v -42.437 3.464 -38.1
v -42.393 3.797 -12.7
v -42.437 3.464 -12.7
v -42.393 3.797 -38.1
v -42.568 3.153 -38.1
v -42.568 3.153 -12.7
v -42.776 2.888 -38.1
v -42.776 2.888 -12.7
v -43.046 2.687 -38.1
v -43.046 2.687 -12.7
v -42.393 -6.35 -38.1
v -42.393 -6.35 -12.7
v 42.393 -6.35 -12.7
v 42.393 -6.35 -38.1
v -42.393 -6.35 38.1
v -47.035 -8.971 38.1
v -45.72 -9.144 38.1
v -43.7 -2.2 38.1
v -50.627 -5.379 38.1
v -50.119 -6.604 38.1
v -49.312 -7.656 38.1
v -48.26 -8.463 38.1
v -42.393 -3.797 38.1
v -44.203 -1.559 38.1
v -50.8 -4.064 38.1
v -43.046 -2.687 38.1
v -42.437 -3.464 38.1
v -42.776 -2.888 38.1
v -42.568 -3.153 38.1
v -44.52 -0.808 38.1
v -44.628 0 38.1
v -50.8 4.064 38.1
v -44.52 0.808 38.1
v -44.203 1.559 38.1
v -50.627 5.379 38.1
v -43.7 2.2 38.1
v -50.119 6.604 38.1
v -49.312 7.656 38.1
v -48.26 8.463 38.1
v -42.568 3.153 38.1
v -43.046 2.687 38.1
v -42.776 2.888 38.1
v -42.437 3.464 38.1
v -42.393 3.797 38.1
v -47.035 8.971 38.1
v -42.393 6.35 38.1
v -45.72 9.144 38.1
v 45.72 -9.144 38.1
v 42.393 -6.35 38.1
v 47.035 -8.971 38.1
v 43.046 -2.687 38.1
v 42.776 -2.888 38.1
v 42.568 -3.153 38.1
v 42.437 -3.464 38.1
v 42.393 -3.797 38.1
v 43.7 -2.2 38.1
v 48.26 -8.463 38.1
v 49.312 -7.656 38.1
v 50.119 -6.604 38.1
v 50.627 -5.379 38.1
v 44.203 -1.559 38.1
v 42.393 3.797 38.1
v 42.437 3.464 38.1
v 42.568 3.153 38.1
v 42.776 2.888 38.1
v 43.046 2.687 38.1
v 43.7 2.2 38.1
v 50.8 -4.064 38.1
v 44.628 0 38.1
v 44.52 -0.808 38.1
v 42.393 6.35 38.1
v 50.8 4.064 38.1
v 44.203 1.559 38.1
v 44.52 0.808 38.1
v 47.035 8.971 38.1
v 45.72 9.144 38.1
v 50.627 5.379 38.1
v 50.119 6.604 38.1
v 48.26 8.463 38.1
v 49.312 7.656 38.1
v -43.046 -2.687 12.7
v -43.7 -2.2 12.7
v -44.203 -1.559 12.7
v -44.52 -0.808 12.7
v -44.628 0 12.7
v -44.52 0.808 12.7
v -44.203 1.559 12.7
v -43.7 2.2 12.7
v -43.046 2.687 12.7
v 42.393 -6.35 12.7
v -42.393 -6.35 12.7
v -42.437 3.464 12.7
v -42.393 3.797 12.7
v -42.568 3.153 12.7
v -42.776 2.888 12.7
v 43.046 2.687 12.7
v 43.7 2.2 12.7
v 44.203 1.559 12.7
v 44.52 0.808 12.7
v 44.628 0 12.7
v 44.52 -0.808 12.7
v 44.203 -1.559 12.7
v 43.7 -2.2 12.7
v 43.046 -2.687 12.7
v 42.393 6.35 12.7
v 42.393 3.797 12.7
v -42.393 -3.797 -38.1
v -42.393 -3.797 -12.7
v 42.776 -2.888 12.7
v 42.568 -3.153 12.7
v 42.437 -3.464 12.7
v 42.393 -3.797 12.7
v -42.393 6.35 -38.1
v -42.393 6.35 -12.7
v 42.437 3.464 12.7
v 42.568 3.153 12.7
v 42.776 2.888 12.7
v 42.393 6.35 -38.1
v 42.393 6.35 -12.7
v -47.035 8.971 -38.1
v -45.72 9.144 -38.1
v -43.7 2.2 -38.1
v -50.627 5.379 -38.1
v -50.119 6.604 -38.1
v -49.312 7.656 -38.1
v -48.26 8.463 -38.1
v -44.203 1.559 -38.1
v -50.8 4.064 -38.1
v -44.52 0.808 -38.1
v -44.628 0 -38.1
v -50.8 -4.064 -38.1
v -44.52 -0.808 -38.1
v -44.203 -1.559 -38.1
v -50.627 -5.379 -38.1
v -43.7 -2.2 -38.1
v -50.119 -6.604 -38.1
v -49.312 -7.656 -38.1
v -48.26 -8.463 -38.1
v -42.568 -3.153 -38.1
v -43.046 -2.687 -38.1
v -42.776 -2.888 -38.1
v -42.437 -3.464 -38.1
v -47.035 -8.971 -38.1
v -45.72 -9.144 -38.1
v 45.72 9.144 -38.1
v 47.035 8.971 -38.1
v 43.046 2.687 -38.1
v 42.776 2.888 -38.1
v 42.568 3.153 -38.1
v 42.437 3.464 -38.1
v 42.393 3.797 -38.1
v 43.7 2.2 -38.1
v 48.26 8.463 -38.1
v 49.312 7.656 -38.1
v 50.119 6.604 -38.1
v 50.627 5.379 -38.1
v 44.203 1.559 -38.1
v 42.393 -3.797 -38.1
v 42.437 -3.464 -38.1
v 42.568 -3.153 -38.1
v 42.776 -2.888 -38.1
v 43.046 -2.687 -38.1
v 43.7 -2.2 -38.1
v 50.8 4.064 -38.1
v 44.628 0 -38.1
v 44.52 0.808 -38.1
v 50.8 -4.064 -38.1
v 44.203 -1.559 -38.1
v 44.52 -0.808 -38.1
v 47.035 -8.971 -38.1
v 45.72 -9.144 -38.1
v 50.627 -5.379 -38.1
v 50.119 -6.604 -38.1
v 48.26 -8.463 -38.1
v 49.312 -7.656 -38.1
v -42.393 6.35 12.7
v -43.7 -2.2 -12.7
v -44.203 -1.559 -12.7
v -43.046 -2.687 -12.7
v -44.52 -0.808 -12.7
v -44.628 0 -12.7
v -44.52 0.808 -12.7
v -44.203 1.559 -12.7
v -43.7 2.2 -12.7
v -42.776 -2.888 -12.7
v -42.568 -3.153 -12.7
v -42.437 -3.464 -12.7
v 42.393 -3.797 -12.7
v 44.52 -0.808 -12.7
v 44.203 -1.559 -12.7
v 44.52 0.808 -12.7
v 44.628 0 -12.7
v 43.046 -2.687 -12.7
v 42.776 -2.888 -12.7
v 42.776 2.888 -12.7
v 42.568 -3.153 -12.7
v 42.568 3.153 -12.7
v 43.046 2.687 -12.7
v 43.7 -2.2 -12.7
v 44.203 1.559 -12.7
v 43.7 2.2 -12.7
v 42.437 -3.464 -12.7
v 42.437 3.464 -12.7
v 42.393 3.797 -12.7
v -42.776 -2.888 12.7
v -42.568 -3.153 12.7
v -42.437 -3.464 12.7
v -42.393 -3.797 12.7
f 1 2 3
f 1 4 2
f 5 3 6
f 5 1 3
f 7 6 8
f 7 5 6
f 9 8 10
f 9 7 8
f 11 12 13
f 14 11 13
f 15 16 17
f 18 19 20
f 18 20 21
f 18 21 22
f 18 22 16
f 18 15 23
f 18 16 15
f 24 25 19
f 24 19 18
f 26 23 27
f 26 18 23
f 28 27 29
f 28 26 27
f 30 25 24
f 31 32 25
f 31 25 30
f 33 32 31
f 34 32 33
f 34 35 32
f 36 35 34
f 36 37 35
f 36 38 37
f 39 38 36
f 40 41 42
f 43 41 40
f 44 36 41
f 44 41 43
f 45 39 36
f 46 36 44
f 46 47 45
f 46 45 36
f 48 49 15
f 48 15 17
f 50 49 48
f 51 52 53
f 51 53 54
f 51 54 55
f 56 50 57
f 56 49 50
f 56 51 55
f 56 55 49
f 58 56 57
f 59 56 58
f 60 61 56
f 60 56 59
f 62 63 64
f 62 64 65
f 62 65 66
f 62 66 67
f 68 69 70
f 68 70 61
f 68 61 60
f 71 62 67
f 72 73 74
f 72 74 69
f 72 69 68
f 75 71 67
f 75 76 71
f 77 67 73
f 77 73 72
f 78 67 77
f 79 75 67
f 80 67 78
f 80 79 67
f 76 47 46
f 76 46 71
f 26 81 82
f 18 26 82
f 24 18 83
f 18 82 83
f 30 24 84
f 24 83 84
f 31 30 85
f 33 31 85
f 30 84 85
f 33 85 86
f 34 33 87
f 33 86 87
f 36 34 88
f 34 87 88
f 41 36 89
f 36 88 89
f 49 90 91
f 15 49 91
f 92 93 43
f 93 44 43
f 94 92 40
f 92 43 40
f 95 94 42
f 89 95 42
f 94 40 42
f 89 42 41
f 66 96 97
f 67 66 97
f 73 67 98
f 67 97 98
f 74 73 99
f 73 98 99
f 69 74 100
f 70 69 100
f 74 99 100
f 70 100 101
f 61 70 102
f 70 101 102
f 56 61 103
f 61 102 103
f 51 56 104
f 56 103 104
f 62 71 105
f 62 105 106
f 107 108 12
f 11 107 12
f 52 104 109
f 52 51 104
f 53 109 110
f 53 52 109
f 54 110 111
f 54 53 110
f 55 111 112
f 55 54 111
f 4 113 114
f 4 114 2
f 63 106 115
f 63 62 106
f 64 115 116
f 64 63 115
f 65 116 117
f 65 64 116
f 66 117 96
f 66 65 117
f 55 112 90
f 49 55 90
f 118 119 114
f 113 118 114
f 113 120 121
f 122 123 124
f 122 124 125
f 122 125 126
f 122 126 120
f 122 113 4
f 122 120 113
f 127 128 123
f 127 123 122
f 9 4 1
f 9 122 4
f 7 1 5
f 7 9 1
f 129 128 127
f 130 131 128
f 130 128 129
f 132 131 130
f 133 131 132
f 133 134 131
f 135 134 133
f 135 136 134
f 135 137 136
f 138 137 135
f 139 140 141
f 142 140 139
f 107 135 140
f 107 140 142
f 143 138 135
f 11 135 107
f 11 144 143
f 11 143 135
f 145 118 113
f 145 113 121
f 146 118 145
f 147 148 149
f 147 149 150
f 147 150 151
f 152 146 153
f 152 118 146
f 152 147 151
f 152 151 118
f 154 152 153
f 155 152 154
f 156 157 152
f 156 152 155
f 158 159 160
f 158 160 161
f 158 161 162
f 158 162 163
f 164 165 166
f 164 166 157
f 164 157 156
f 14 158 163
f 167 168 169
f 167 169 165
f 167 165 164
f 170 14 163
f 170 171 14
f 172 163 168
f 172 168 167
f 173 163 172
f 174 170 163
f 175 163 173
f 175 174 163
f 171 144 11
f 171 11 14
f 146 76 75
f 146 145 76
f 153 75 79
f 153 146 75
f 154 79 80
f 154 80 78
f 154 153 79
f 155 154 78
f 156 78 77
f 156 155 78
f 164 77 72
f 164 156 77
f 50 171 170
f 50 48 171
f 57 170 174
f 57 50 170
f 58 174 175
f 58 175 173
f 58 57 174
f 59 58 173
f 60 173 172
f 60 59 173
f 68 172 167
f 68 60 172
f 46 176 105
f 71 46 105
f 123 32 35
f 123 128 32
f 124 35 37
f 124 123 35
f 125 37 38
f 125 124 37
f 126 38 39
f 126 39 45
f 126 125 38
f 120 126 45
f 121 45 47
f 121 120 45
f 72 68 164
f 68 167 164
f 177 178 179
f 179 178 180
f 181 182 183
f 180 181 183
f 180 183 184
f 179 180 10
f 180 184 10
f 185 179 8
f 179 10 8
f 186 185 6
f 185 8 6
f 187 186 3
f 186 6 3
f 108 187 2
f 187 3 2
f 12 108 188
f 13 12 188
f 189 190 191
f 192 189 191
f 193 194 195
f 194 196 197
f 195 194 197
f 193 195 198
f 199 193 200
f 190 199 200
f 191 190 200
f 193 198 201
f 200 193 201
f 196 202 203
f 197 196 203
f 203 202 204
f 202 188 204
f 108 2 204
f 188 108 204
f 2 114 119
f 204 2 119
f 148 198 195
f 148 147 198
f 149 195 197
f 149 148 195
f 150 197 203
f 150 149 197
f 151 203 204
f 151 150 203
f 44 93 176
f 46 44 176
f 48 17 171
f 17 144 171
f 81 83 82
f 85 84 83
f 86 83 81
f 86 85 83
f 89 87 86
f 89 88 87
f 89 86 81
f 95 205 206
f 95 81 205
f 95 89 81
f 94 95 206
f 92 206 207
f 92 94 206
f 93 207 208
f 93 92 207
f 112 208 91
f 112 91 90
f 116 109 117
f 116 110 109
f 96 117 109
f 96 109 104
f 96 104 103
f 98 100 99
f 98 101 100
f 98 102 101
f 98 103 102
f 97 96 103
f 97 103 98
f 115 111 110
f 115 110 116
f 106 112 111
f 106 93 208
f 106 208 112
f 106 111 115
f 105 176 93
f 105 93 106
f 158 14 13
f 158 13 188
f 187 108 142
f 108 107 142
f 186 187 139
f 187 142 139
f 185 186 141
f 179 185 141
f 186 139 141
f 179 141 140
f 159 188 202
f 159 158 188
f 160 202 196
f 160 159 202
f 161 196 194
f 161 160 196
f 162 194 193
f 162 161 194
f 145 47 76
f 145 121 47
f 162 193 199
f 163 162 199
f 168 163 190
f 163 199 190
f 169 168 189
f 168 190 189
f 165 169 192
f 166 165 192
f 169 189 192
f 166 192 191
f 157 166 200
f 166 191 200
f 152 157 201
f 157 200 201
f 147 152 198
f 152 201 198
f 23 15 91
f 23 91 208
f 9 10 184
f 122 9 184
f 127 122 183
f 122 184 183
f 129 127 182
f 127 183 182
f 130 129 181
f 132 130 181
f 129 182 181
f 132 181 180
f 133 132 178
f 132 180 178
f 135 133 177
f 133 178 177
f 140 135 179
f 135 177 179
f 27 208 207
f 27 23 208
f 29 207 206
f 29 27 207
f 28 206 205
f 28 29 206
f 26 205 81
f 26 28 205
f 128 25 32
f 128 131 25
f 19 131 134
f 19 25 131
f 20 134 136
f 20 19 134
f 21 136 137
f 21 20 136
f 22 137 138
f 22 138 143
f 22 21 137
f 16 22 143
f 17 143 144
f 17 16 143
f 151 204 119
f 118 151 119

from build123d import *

# Parameters (mm, degrees)
F0_W     = 101.6
F0_H     = 18.288
F1_DEPTH = 12.7
F2_W     = 101.6
F2_H     = 18.288
F4_DEPTH = 25.4
F3_W     = 101.6
F3_H     = 18.288
F5_DEPTH = 25.4
F6_R     = 1.27
F7_R     = 5.08


with BuildPart() as f1:
    # F0 (on Top) → F1 (new body, symmetric)
    with BuildSketch(Plane.XY):
        Rectangle(F0_W, F0_H)
    extrude(amount=F1_DEPTH, both=True)

    # F2 (on face) → F4 (join)
    with BuildSketch(Plane(origin=(0, 0, -12.7), x_dir=(1, 0, 0), z_dir=(0, 0, -1))):
        Rectangle(F2_W, F2_H)
        with BuildLine():
            Line((-42.3926, 2.956892), (-42.3926, 6.35))
            Line((-42.3926, 6.35), (42.3926, 6.35))
            Line((42.3926, 6.35), (42.3926, 2.956892))
            ThreePointArc((42.3926, 2.956892), (44.6278, 0), (42.3926, -2.956892))
            Line((42.3926, -2.956892), (42.3926, -6.35))
            Line((42.3926, -6.35), (-42.3926, -6.35))
            Line((-42.3926, -6.35), (-42.3926, -2.956892))
            ThreePointArc((-42.3926, -2.956892), (-44.6278, 0), (-42.3926, 2.956892))
        make_face(mode=Mode.SUBTRACT)
    extrude(amount=F4_DEPTH)

    # F3 (on face) → F5 (join)
    with BuildSketch(Plane.XY.offset(12.7)):
        Rectangle(F3_W, F3_H)
        with BuildLine():
            Line((-42.3926, 2.956892), (-42.3926, 6.35))
            Line((-42.3926, 6.35), (42.3926, 6.35))
            Line((42.3926, 6.35), (42.3926, 2.956892))
            ThreePointArc((42.3926, 2.956892), (44.6278, 0), (42.3926, -2.956892))
            Line((42.3926, -2.956892), (42.3926, -6.35))
            Line((42.3926, -6.35), (-42.3926, -6.35))
            Line((-42.3926, -6.35), (-42.3926, -2.956892))
            ThreePointArc((-42.3926, -2.956892), (-44.6278, 0), (-42.3926, 2.956892))
        make_face(mode=Mode.SUBTRACT)
    extrude(amount=F5_DEPTH)

    # F6
    f6_edges = [f1.edges().sort_by_distance(p)[0] for p in [
        (-42.3926, -2.956892, -25.4),
        (-42.3926, 2.956892, -25.4),
        (42.3926, -2.956892, -25.4),
        (42.3926, 2.956892, -25.4),
        (42.3926, -2.956892, 25.4),
        (42.3926, 2.956892, 25.4),
        (-42.3926, -2.956892, 25.4),
        (-42.3926, 2.956892, 25.4),
    ]]
    fillet(f6_edges, radius=F6_R)

    # F7
    f7_edges = [f1.edges().sort_by_distance(p)[0] for p in [
        (50.8, -9.144, 0),
        (50.8, 9.144, 0),
        (-50.8, -9.144, 0),
        (-50.8, 9.144, 0),
    ]]
    fillet(f7_edges, radius=F7_R)


solid = f1.part
